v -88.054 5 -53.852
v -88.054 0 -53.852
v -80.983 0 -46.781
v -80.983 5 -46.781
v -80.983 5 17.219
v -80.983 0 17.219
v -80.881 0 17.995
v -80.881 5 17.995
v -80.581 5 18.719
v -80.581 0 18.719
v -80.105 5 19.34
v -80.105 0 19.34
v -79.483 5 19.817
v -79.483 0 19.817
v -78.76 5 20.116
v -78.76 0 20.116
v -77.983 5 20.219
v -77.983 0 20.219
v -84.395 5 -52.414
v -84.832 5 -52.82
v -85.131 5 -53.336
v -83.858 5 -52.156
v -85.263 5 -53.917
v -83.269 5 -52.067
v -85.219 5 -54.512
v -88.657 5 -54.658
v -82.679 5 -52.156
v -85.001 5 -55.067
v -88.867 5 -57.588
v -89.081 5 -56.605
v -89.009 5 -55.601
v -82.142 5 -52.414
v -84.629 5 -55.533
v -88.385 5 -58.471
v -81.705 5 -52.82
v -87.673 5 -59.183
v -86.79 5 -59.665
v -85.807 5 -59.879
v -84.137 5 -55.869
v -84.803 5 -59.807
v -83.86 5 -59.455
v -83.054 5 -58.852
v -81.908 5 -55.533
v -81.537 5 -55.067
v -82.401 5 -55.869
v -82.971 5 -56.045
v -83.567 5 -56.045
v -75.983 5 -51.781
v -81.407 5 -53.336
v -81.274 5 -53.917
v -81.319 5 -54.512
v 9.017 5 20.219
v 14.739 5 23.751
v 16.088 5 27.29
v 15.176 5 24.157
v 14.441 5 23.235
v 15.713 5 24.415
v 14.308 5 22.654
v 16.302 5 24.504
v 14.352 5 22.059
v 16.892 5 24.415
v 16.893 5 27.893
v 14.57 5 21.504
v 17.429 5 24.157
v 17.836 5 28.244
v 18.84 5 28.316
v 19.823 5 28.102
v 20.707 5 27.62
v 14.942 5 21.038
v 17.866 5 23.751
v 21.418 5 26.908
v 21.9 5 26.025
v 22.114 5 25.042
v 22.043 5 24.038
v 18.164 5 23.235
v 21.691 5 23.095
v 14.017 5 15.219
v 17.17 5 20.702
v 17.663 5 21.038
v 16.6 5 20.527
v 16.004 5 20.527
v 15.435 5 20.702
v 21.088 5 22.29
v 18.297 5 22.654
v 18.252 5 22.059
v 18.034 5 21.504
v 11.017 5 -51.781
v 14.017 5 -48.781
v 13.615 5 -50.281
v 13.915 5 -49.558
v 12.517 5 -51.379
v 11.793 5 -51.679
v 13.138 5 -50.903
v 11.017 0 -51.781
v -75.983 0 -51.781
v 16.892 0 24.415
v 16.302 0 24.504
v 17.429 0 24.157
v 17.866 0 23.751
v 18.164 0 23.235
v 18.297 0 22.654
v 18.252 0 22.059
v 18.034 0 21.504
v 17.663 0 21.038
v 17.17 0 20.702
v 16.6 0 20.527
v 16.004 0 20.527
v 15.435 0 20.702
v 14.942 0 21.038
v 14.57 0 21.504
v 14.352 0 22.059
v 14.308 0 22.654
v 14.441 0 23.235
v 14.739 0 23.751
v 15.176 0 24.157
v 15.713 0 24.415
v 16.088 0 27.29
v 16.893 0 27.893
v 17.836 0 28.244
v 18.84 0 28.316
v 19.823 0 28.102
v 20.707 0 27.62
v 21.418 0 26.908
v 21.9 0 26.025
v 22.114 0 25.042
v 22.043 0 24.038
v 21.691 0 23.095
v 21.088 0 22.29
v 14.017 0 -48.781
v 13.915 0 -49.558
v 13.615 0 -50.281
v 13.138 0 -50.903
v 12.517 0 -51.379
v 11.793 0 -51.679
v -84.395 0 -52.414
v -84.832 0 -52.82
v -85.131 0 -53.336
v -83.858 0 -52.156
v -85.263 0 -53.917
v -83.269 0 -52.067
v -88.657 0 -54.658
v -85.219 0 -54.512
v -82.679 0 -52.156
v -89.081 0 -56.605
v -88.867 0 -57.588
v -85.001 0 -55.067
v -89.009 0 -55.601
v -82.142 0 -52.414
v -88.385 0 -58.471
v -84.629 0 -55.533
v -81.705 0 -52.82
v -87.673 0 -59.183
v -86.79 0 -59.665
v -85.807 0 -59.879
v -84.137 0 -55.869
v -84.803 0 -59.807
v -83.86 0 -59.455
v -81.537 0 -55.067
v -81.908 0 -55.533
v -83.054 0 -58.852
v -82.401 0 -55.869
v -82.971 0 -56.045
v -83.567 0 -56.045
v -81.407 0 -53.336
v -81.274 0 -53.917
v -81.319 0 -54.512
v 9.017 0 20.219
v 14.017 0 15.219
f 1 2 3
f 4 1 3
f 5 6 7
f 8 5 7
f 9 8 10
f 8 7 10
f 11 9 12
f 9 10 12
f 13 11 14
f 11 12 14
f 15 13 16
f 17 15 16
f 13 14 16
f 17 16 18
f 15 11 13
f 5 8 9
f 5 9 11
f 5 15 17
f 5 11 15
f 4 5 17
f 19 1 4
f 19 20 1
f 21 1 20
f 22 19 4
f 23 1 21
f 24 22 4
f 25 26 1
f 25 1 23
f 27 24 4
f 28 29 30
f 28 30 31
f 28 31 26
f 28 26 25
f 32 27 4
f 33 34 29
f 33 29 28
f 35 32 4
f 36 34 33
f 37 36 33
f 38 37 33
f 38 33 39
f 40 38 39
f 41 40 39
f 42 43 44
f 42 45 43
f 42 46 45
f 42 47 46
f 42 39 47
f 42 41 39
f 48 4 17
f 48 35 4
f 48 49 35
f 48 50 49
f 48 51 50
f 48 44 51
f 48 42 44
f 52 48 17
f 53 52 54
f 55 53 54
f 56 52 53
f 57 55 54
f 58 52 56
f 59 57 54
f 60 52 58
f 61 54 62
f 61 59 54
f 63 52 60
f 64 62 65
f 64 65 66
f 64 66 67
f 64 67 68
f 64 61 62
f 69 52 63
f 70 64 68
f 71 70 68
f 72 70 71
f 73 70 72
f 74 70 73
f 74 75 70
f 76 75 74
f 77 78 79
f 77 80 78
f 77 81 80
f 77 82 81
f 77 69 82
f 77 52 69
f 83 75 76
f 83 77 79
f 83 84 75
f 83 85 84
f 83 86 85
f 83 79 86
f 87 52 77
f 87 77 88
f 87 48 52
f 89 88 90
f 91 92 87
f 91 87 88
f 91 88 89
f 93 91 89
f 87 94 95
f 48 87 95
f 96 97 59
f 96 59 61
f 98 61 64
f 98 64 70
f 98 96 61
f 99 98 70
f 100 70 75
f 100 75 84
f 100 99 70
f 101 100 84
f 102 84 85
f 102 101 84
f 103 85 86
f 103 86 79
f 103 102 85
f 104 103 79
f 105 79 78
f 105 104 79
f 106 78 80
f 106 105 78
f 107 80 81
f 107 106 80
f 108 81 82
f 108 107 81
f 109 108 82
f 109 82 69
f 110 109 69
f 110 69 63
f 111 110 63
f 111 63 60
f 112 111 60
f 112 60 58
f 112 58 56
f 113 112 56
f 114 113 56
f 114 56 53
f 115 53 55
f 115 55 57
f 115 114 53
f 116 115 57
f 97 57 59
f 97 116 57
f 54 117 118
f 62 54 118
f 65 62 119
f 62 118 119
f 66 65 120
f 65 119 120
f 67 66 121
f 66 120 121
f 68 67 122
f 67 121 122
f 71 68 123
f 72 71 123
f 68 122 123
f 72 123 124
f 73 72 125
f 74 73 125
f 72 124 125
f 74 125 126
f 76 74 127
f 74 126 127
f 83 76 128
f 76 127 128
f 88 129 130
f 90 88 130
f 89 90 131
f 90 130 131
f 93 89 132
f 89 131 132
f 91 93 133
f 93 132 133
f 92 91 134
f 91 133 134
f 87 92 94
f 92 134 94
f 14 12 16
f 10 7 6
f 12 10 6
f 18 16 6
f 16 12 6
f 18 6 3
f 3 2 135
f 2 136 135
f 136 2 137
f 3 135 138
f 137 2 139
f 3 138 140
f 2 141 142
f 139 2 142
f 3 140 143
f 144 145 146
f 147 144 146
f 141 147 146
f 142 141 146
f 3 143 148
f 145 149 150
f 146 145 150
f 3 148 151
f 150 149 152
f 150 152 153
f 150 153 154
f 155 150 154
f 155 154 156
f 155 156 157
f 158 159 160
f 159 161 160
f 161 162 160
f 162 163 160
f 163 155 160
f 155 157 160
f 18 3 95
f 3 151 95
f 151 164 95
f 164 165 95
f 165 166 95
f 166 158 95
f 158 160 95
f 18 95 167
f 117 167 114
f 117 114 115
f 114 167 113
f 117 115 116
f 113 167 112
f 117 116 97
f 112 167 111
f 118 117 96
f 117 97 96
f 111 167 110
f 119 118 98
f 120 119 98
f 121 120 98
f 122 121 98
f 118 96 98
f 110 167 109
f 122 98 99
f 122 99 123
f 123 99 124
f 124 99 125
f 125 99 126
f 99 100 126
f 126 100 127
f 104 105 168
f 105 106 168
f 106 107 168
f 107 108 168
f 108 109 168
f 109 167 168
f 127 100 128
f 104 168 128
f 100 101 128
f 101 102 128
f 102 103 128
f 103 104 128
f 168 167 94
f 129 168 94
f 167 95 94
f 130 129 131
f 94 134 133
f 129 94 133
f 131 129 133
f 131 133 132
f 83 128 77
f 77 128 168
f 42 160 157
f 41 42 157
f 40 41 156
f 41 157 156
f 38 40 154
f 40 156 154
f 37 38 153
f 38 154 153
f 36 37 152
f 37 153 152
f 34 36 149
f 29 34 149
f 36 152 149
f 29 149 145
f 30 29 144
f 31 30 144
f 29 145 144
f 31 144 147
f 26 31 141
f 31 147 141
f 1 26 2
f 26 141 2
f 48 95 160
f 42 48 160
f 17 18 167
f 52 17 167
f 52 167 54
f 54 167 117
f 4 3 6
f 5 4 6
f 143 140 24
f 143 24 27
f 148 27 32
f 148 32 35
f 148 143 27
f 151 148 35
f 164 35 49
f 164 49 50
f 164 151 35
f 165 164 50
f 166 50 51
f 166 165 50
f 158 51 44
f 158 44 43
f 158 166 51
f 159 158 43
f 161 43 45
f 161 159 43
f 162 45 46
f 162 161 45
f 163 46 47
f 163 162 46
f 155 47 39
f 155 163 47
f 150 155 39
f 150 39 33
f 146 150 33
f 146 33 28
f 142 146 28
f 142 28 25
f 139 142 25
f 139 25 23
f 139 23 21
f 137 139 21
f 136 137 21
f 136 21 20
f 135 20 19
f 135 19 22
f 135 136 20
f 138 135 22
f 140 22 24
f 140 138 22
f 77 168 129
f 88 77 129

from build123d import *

# Parameters (mm, degrees)
ESBO_O1_R                = 2
RESSALTO_EXTRUS_O1_DEPTH = 5


with BuildPart() as part:
    # Esboço1 → Ressalto-extrusão1 (new body)
    # profile 1 of 2: a face of its own
    with BuildSketch(Plane(origin=(0, 0, 0), x_dir=(1, 0, 0), z_dir=(0, 1, 0))):
        with BuildLine():
            Line((9.016735984, -20.218643644), (16.087803796, -27.289711456))
            ThreePointArc((16.087803796, -27.289711456), (21.087803796, -27.289711456), (21.087803796, -22.289711456))
            Line((21.087803796, -22.289711456), (14.016735984, -15.218643644))
            Line((14.016735984, -15.218643644), (14.016735984, 48.781356356))
            ThreePointArc((14.016735984, 48.781356356), (13.138056327, 50.902676699), (11.016735984, 51.781356356))
            Line((11.016735984, 51.781356356), (-75.983264016, 51.781356356))
            Line((-75.983264016, 51.781356356), (-80.983264016, 46.781356356))
            Line((-80.983264016, 46.781356356), (-80.983264016, -17.218643644))
            ThreePointArc((-80.983264016, -17.218643644), (-80.10458436, -19.339963988), (-77.983264016, -20.218643644))
            Line((-77.983264016, -20.218643644), (9.016735984, -20.218643644))
        make_face()
        with Locations(Location((16.30226989, -22.50417755, 0), (0, 0, 270))):
            Circle(ESBO_O1_R, mode=Mode.SUBTRACT)
    # profile 2 of 2: a face of its own
    with BuildSketch(Plane(origin=(0, 0, 0), x_dir=(1, 0, 0), z_dir=(0, 1, 0))):
        with BuildLine():
            Line((-75.983264016, 51.781356356), (-83.054331828, 58.852424167))
            ThreePointArc((-83.054331828, 58.852424167), (-88.054331828, 58.852424167), (-88.054331828, 53.852424167))
            Line((-88.054331828, 53.852424167), (-80.983264016, 46.781356356))
            Line((-80.983264016, 46.781356356), (-75.983264016, 51.781356356))
        make_face()
        with Locations(Location((-83.268797922, 54.066890262, 0), (0, 0, 270))):
            Circle(ESBO_O1_R, mode=Mode.SUBTRACT)
    extrude(amount=RESSALTO_EXTRUS_O1_DEPTH)


solid = part.part
